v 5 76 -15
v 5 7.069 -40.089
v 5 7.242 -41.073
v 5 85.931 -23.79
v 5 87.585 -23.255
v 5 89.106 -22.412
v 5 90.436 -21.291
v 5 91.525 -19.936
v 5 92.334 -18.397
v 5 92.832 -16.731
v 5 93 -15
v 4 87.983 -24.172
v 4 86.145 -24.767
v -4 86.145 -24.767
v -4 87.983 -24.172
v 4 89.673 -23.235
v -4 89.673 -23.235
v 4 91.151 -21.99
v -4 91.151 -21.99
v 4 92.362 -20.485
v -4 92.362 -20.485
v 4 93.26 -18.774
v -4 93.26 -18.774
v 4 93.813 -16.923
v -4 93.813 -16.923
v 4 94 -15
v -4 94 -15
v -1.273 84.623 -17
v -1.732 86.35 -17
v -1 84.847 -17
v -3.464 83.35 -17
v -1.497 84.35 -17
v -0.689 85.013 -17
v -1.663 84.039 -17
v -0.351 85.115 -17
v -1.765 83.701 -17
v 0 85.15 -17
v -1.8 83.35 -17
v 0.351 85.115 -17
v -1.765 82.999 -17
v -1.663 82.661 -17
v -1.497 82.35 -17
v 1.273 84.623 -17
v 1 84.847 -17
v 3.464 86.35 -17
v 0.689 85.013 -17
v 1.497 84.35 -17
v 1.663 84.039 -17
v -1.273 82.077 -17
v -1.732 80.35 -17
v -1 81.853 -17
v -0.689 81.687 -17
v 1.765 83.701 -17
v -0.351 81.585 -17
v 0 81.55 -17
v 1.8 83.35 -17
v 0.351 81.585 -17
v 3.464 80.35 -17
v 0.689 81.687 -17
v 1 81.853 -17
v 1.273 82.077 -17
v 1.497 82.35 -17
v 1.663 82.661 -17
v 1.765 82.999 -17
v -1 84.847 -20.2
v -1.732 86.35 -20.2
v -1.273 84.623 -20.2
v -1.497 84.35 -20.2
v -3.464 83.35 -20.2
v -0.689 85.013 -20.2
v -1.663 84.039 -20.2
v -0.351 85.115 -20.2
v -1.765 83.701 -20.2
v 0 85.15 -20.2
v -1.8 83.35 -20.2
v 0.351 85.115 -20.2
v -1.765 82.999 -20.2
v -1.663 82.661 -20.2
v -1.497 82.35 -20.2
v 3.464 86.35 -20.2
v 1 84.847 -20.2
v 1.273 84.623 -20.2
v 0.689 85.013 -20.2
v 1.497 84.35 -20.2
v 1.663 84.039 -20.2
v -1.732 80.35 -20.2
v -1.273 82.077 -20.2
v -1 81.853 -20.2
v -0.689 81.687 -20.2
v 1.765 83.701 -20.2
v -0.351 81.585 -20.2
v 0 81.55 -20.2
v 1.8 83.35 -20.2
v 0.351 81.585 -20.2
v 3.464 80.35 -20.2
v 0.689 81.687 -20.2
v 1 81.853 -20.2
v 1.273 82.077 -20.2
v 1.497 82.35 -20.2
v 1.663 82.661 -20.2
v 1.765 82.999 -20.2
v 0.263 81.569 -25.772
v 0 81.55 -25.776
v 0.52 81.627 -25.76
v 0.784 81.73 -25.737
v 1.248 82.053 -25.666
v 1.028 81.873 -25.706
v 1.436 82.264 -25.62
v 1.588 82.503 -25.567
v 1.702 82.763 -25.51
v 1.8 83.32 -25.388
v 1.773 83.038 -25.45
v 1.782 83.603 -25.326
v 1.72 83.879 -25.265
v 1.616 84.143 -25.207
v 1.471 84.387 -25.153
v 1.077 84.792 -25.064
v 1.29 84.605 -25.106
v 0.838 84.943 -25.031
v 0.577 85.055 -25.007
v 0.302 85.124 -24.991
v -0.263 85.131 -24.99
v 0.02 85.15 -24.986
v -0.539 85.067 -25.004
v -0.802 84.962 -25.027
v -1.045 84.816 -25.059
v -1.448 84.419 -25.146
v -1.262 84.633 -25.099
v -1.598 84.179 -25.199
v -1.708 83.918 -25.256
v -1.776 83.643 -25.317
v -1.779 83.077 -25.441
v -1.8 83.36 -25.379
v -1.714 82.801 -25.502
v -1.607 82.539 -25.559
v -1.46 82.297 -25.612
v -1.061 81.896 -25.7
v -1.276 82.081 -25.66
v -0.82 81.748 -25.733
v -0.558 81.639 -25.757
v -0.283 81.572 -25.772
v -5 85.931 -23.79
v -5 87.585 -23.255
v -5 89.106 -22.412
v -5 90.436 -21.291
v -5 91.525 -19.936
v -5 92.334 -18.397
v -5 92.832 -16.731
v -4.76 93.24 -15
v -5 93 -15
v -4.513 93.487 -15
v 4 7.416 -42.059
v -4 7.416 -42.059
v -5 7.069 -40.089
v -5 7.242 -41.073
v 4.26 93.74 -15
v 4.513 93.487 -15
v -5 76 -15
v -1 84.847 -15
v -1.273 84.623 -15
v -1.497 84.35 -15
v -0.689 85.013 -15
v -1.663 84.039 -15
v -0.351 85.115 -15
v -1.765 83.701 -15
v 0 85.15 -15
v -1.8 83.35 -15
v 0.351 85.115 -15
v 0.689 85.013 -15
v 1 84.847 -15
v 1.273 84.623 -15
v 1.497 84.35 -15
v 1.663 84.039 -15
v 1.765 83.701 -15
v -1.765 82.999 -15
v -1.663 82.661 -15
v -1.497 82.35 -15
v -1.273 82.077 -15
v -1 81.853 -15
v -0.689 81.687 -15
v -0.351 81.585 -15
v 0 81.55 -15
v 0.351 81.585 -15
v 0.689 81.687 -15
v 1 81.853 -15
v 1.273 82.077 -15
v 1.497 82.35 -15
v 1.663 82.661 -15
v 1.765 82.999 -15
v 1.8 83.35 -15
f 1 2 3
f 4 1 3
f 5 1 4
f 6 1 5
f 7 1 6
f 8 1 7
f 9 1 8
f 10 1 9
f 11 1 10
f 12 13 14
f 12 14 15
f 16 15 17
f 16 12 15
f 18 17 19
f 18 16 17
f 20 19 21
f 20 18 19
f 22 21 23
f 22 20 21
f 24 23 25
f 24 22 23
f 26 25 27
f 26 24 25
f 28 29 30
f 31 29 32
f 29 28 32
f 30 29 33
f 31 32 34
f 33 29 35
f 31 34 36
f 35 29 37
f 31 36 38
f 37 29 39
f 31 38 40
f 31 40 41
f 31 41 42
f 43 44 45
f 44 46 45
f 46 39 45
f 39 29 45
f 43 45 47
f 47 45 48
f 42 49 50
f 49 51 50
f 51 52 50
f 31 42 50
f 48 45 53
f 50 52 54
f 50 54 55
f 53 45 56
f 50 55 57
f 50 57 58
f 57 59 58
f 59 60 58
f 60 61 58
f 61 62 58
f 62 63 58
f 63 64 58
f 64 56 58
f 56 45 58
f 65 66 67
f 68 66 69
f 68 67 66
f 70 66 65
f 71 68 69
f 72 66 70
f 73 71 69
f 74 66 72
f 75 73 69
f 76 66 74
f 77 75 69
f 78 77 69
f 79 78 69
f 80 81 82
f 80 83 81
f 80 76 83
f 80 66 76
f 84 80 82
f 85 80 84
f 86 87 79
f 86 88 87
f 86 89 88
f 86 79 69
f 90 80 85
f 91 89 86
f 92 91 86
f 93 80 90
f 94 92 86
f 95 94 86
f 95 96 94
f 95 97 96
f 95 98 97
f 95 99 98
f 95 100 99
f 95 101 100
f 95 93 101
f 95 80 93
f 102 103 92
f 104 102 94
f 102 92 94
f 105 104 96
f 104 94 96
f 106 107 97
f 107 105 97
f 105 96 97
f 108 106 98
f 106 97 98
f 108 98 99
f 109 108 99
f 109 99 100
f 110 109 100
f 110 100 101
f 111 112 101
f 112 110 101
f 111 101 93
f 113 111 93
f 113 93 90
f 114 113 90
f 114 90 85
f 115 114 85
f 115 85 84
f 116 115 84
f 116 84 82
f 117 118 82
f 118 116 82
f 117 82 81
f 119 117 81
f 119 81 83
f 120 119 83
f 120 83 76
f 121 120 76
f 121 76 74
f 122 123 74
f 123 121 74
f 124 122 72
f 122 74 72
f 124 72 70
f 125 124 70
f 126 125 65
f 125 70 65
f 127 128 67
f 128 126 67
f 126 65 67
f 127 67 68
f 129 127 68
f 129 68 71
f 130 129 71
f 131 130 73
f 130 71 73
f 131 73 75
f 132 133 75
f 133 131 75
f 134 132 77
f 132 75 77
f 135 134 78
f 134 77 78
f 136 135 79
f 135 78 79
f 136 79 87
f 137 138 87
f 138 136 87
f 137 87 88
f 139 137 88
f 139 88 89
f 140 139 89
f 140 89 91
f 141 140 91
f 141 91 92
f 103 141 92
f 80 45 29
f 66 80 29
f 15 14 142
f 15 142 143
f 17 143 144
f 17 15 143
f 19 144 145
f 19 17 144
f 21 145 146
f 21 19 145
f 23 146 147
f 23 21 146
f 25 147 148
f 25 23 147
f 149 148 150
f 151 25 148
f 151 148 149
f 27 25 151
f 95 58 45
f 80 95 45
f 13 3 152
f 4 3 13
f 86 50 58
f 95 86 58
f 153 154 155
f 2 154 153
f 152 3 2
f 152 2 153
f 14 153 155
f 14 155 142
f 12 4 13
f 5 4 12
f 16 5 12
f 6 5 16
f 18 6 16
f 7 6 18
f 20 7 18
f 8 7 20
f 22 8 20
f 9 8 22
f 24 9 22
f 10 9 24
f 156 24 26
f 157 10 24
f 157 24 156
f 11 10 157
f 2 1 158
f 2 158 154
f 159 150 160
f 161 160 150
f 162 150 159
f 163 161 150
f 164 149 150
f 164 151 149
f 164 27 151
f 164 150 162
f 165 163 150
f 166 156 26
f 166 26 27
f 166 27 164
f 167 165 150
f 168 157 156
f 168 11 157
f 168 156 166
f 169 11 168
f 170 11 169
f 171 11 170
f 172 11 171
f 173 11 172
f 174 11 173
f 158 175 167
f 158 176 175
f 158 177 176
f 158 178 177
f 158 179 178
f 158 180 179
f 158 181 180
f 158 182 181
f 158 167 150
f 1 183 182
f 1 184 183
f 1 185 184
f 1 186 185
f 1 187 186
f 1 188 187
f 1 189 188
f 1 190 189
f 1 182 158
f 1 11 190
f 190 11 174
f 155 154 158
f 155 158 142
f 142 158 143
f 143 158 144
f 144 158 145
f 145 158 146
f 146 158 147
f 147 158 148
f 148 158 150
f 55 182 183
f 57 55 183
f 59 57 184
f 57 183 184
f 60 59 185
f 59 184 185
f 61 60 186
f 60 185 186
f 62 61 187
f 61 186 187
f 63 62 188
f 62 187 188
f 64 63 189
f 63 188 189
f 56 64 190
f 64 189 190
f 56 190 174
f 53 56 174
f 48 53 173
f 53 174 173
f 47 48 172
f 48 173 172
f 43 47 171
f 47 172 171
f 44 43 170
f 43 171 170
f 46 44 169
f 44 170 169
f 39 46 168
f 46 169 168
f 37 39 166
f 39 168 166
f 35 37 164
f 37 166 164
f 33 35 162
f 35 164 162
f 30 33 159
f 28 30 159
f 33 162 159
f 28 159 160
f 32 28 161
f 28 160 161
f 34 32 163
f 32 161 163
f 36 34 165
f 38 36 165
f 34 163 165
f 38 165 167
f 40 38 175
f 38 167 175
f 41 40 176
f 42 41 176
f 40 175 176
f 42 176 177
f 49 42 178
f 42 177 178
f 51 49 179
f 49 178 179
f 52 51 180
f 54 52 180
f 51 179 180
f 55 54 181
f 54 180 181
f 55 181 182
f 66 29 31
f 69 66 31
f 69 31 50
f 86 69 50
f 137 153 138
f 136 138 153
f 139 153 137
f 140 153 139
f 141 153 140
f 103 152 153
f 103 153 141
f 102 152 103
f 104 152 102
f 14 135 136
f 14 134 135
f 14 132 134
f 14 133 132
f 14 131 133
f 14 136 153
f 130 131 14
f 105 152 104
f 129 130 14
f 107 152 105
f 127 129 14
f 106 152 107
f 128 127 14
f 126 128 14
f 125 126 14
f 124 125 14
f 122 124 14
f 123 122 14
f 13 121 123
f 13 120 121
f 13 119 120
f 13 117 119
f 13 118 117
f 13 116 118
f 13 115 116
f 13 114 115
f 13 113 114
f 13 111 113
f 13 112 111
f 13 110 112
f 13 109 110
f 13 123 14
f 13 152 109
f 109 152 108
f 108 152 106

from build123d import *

# Parameters (mm, degrees)
PAD013_DEPTH    = 5
SKETCH029_R     = 1.8
POCKET014_DEPTH = 2
POCKET015_DEPTH = 3.2
SKETCH031_R     = 1.8
POCKET016_DEPTH = 21.859536
CHAMFER004_SIZE = 1


with BuildPart() as part:
    # Sketch028 → Pad013 (new body, symmetric)
    with BuildSketch(Plane.YZ):
        with BuildLine():
            Line((94, -15), (76, -15))
            Line((76, -15), (7.068758, -40.08892))
            Line((7.068758, -40.08892), (7.416055, -42.058536))
            Line((7.416055, -42.058536), (86.145177, -24.767201))
            ThreePointArc((86.145177, -24.767201), (91.792682, -21.266906), (94, -15))
        make_face()
    extrude(amount=PAD013_DEPTH, both=True)

    # Sketch029 (on Face1 of Pad013) → Pocket014 (cut)
    with BuildSketch(Plane(origin=(0, 0, -15), x_dir=(0, -1, 0), z_dir=(0, 0, 1))):
        with Locations((-83.35, 0)):
            Circle(SKETCH029_R)
    extrude(amount=-POCKET014_DEPTH, mode=Mode.SUBTRACT)

    # Sketch030 (on Face9 of Pocket014) → Pocket015 (cut)
    with BuildSketch(Plane(origin=(0, 0, -17), x_dir=(0, -1, 0), z_dir=(0, 0, 1))):
        Polygon((-86.35, 1.732051), (-86.35, -1.732051), (-83.35, -3.464102), (-80.35, -1.732051), (-80.35, 1.732051), (-80.35, 3.464102), (-86.35, 3.464102), align=None)
    extrude(amount=-POCKET015_DEPTH, mode=Mode.SUBTRACT)

    # Sketch031 (on Face15 of Pocket015) → Pocket016 (cut, through all)
    with BuildSketch(Plane(origin=(0, 0, -20.2), x_dir=(0, -1, 0), z_dir=(0, 0, 1))):
        with Locations((-83.35, 0)):
            Circle(SKETCH031_R)
    extrude(amount=-POCKET016_DEPTH, mode=Mode.SUBTRACT)

    # Chamfer004
    chamfer004_edges = [part.edges().sort_by_distance(p)[0] for p in [
        (5, 91.792682, -21.266906),
        (-5, 91.792682, -21.266906),
    ]]
    chamfer(chamfer004_edges, length=CHAMFER004_SIZE)


solid = part.part
